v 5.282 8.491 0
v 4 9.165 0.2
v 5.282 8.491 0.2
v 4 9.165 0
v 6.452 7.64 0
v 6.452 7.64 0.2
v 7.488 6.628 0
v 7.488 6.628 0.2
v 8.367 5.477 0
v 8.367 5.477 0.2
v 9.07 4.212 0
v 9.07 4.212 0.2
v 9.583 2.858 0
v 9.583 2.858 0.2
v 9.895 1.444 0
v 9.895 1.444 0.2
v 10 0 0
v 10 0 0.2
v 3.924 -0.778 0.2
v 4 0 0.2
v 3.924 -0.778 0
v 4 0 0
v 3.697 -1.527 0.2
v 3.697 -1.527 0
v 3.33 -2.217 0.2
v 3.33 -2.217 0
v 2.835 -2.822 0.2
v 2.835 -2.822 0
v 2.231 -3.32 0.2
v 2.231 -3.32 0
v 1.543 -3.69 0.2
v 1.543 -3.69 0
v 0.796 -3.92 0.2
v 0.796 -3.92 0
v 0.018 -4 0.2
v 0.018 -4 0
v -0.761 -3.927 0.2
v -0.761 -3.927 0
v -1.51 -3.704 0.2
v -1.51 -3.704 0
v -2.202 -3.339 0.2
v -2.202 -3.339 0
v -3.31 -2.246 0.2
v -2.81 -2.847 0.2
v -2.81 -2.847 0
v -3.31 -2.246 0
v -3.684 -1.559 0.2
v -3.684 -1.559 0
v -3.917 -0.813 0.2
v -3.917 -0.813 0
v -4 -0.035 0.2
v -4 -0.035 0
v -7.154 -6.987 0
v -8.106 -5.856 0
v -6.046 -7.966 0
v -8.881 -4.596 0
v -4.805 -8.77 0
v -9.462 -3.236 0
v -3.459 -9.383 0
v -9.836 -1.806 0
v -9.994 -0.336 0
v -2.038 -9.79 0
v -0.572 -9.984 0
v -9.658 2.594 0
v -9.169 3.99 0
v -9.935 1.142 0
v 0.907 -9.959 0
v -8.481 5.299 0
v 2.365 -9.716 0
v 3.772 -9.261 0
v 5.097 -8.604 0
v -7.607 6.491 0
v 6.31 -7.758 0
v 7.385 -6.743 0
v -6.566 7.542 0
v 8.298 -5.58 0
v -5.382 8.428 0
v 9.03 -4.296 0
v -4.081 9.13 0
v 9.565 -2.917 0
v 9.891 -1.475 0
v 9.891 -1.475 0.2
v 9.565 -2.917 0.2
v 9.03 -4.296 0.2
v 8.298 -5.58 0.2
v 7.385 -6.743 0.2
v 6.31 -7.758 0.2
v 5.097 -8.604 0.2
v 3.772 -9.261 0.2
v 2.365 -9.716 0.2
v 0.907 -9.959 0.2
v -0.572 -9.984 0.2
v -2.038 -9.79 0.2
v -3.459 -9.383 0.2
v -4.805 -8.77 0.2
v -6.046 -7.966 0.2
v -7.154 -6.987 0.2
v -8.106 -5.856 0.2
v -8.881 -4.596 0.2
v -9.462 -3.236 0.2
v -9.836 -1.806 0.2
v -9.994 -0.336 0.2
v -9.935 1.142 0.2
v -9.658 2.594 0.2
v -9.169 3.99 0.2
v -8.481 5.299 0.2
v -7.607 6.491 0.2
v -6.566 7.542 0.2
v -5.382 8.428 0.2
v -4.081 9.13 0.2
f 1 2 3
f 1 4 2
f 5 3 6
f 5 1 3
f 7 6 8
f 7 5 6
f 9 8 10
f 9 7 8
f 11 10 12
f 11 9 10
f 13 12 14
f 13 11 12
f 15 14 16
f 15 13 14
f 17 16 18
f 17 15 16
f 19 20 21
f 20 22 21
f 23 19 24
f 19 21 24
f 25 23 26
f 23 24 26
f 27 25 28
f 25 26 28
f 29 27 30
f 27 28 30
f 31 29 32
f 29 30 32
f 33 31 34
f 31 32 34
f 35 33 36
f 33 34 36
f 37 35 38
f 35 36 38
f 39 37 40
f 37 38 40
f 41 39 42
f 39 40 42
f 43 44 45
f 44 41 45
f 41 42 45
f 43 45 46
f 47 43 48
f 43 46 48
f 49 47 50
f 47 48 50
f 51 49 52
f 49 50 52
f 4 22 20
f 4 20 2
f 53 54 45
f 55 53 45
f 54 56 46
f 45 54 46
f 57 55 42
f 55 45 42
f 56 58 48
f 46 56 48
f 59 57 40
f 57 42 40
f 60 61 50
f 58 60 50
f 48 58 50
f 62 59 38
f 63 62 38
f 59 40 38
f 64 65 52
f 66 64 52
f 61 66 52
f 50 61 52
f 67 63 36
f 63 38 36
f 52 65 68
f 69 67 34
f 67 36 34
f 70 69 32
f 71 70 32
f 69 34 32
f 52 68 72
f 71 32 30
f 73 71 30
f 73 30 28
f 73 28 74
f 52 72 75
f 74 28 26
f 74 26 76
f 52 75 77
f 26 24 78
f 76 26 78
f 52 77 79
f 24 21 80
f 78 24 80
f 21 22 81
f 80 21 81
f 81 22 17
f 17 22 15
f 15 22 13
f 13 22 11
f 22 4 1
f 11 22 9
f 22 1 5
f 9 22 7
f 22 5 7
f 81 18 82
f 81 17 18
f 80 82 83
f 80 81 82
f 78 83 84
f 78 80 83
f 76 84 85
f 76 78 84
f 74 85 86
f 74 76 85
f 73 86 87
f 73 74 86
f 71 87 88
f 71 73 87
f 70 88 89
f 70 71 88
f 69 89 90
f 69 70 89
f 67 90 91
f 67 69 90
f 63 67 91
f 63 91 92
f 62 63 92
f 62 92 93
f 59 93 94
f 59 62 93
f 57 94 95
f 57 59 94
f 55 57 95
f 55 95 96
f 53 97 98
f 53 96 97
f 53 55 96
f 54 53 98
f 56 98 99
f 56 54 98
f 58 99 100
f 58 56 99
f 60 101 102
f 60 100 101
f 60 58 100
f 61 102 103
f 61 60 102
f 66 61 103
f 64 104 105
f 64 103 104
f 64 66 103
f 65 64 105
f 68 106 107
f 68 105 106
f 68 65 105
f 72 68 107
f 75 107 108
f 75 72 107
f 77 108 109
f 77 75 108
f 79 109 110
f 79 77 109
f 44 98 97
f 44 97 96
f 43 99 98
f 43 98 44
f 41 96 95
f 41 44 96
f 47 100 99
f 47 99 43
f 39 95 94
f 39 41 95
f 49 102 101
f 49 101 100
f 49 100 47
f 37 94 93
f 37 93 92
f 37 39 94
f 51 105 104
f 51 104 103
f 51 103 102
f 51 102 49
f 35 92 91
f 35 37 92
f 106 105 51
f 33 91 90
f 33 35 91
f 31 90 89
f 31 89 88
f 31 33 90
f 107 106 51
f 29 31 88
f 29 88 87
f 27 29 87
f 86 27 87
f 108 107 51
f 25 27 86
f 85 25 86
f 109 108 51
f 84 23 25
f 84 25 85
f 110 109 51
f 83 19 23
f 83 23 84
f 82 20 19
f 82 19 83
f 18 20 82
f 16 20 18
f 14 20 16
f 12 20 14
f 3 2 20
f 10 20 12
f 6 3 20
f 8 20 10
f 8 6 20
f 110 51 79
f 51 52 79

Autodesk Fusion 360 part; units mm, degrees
sketch "Sketch1" plane through (0, 0, 0) normal (0, 0, 1) x (1, 0, 0)
  circle A0 centre (0, 0) radius 4
  circle A1 centre (0, 0) radius 10
  line L0 (4, 0) -> (4, 9.1652)
  line L1 (-3.9998, -0.0353) -> (-4.0808, 9.1295)
  dimension "d1" = 8
  dimension "d2" = 20
extrude "Extrude1" add sketch "Sketch1" along normal blind 0.2 contours A0 A1 L0 L1 picked at (-7.9763, 0.257)
